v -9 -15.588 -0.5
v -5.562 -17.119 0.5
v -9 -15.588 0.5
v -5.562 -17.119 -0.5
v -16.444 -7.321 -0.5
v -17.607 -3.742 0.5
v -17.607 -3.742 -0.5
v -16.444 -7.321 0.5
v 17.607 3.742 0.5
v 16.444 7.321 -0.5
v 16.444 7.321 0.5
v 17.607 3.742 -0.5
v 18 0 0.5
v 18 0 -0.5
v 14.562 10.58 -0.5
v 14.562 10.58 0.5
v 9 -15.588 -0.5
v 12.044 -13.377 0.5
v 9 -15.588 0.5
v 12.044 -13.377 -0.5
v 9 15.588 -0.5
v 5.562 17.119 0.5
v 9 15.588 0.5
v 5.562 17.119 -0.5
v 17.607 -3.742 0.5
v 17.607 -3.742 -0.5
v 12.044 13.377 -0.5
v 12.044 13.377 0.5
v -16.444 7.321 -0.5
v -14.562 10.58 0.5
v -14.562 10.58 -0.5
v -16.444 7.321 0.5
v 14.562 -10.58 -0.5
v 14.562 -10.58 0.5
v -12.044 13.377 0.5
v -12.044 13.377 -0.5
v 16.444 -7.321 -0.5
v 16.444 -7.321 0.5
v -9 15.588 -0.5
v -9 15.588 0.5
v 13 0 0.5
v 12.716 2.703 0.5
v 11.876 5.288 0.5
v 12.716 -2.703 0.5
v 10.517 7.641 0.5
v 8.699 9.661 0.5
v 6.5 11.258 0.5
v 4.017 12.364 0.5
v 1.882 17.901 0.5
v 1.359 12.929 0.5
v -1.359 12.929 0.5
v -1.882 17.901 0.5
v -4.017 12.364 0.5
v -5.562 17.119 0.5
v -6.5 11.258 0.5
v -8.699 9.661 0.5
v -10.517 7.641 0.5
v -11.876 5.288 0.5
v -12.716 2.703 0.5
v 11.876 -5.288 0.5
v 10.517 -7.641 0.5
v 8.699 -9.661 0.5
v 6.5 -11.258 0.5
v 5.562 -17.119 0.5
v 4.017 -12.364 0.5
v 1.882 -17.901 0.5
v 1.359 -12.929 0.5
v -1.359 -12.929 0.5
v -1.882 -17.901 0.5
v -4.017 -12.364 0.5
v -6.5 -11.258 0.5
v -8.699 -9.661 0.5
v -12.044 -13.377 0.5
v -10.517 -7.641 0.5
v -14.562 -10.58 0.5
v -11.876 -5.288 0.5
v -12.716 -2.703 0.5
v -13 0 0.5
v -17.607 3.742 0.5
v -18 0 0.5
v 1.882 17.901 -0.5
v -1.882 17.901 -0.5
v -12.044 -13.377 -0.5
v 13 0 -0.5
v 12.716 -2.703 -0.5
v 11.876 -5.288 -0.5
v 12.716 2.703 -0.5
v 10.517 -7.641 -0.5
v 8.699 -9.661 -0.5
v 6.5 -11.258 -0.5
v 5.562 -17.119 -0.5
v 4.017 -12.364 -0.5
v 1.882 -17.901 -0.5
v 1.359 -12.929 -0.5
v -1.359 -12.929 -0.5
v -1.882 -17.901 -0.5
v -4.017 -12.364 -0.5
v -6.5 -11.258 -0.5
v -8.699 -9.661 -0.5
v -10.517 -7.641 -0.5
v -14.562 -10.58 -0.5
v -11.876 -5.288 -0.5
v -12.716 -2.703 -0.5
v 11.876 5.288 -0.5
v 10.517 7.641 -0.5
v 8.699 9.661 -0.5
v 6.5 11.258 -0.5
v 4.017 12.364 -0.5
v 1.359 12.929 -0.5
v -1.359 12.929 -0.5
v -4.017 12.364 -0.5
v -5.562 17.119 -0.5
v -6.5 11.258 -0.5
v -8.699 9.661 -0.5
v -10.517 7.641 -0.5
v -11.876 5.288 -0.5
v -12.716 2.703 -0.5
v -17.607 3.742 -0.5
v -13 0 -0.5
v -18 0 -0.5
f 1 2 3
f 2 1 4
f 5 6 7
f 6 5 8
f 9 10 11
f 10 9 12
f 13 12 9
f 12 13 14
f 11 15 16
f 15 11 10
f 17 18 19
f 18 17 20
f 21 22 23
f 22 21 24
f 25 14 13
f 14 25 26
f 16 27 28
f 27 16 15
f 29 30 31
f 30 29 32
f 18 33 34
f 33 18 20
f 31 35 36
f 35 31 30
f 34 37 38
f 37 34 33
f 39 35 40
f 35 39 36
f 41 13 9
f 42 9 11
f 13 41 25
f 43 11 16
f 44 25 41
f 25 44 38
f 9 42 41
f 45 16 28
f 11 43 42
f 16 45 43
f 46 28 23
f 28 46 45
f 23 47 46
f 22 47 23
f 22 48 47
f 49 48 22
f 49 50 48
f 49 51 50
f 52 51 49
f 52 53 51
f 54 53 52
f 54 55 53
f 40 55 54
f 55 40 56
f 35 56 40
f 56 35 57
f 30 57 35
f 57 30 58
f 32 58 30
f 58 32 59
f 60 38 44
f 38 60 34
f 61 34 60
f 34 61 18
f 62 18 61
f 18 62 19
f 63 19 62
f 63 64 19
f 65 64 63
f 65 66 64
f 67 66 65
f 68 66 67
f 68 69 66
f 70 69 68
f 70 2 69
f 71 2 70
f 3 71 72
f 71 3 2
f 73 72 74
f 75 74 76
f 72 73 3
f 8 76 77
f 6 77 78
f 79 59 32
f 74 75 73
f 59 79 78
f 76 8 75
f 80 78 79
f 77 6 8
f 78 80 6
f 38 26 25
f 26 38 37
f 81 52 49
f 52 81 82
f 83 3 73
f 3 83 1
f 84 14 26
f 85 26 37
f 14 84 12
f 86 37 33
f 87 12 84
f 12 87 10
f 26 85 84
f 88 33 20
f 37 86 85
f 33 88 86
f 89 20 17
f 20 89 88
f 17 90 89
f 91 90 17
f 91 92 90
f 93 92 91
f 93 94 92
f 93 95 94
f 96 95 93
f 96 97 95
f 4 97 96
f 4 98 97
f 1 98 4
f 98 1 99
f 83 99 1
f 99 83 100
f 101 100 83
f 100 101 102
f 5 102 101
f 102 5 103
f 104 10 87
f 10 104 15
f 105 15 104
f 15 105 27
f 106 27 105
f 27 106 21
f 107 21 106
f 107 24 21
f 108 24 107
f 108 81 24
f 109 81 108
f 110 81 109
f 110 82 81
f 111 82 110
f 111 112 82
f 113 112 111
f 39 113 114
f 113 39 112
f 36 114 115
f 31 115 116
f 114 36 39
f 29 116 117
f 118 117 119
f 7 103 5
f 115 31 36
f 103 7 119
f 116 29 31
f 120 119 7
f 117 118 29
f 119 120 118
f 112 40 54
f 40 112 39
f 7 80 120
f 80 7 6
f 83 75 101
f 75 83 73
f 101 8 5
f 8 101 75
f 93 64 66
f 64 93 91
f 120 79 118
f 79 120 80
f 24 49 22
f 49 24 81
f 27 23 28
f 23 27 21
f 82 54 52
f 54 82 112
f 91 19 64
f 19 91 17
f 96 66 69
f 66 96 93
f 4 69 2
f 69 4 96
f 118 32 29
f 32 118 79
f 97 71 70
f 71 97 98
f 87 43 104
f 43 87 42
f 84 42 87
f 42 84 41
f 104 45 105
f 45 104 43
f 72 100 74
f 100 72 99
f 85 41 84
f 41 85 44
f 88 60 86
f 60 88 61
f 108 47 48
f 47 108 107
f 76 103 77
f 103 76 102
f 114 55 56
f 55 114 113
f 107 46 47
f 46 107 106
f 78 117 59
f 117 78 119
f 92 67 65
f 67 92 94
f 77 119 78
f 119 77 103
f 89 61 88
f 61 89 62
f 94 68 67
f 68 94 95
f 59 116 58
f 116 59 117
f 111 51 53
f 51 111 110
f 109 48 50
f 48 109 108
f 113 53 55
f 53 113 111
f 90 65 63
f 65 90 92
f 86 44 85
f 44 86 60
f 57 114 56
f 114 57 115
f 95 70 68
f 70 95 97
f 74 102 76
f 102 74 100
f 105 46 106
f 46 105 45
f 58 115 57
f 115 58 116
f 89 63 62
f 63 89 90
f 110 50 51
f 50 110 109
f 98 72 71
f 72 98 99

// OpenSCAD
ring_inner_diameter = 13;
ring_outer_diameter = 18;
ring_thickness = 1;

difference(){
    cylinder(h=ring_thickness,r=ring_outer_diameter,center=true);
    cylinder(h=ring_thickness+2,r=ring_inner_diameter,center=true);
}
